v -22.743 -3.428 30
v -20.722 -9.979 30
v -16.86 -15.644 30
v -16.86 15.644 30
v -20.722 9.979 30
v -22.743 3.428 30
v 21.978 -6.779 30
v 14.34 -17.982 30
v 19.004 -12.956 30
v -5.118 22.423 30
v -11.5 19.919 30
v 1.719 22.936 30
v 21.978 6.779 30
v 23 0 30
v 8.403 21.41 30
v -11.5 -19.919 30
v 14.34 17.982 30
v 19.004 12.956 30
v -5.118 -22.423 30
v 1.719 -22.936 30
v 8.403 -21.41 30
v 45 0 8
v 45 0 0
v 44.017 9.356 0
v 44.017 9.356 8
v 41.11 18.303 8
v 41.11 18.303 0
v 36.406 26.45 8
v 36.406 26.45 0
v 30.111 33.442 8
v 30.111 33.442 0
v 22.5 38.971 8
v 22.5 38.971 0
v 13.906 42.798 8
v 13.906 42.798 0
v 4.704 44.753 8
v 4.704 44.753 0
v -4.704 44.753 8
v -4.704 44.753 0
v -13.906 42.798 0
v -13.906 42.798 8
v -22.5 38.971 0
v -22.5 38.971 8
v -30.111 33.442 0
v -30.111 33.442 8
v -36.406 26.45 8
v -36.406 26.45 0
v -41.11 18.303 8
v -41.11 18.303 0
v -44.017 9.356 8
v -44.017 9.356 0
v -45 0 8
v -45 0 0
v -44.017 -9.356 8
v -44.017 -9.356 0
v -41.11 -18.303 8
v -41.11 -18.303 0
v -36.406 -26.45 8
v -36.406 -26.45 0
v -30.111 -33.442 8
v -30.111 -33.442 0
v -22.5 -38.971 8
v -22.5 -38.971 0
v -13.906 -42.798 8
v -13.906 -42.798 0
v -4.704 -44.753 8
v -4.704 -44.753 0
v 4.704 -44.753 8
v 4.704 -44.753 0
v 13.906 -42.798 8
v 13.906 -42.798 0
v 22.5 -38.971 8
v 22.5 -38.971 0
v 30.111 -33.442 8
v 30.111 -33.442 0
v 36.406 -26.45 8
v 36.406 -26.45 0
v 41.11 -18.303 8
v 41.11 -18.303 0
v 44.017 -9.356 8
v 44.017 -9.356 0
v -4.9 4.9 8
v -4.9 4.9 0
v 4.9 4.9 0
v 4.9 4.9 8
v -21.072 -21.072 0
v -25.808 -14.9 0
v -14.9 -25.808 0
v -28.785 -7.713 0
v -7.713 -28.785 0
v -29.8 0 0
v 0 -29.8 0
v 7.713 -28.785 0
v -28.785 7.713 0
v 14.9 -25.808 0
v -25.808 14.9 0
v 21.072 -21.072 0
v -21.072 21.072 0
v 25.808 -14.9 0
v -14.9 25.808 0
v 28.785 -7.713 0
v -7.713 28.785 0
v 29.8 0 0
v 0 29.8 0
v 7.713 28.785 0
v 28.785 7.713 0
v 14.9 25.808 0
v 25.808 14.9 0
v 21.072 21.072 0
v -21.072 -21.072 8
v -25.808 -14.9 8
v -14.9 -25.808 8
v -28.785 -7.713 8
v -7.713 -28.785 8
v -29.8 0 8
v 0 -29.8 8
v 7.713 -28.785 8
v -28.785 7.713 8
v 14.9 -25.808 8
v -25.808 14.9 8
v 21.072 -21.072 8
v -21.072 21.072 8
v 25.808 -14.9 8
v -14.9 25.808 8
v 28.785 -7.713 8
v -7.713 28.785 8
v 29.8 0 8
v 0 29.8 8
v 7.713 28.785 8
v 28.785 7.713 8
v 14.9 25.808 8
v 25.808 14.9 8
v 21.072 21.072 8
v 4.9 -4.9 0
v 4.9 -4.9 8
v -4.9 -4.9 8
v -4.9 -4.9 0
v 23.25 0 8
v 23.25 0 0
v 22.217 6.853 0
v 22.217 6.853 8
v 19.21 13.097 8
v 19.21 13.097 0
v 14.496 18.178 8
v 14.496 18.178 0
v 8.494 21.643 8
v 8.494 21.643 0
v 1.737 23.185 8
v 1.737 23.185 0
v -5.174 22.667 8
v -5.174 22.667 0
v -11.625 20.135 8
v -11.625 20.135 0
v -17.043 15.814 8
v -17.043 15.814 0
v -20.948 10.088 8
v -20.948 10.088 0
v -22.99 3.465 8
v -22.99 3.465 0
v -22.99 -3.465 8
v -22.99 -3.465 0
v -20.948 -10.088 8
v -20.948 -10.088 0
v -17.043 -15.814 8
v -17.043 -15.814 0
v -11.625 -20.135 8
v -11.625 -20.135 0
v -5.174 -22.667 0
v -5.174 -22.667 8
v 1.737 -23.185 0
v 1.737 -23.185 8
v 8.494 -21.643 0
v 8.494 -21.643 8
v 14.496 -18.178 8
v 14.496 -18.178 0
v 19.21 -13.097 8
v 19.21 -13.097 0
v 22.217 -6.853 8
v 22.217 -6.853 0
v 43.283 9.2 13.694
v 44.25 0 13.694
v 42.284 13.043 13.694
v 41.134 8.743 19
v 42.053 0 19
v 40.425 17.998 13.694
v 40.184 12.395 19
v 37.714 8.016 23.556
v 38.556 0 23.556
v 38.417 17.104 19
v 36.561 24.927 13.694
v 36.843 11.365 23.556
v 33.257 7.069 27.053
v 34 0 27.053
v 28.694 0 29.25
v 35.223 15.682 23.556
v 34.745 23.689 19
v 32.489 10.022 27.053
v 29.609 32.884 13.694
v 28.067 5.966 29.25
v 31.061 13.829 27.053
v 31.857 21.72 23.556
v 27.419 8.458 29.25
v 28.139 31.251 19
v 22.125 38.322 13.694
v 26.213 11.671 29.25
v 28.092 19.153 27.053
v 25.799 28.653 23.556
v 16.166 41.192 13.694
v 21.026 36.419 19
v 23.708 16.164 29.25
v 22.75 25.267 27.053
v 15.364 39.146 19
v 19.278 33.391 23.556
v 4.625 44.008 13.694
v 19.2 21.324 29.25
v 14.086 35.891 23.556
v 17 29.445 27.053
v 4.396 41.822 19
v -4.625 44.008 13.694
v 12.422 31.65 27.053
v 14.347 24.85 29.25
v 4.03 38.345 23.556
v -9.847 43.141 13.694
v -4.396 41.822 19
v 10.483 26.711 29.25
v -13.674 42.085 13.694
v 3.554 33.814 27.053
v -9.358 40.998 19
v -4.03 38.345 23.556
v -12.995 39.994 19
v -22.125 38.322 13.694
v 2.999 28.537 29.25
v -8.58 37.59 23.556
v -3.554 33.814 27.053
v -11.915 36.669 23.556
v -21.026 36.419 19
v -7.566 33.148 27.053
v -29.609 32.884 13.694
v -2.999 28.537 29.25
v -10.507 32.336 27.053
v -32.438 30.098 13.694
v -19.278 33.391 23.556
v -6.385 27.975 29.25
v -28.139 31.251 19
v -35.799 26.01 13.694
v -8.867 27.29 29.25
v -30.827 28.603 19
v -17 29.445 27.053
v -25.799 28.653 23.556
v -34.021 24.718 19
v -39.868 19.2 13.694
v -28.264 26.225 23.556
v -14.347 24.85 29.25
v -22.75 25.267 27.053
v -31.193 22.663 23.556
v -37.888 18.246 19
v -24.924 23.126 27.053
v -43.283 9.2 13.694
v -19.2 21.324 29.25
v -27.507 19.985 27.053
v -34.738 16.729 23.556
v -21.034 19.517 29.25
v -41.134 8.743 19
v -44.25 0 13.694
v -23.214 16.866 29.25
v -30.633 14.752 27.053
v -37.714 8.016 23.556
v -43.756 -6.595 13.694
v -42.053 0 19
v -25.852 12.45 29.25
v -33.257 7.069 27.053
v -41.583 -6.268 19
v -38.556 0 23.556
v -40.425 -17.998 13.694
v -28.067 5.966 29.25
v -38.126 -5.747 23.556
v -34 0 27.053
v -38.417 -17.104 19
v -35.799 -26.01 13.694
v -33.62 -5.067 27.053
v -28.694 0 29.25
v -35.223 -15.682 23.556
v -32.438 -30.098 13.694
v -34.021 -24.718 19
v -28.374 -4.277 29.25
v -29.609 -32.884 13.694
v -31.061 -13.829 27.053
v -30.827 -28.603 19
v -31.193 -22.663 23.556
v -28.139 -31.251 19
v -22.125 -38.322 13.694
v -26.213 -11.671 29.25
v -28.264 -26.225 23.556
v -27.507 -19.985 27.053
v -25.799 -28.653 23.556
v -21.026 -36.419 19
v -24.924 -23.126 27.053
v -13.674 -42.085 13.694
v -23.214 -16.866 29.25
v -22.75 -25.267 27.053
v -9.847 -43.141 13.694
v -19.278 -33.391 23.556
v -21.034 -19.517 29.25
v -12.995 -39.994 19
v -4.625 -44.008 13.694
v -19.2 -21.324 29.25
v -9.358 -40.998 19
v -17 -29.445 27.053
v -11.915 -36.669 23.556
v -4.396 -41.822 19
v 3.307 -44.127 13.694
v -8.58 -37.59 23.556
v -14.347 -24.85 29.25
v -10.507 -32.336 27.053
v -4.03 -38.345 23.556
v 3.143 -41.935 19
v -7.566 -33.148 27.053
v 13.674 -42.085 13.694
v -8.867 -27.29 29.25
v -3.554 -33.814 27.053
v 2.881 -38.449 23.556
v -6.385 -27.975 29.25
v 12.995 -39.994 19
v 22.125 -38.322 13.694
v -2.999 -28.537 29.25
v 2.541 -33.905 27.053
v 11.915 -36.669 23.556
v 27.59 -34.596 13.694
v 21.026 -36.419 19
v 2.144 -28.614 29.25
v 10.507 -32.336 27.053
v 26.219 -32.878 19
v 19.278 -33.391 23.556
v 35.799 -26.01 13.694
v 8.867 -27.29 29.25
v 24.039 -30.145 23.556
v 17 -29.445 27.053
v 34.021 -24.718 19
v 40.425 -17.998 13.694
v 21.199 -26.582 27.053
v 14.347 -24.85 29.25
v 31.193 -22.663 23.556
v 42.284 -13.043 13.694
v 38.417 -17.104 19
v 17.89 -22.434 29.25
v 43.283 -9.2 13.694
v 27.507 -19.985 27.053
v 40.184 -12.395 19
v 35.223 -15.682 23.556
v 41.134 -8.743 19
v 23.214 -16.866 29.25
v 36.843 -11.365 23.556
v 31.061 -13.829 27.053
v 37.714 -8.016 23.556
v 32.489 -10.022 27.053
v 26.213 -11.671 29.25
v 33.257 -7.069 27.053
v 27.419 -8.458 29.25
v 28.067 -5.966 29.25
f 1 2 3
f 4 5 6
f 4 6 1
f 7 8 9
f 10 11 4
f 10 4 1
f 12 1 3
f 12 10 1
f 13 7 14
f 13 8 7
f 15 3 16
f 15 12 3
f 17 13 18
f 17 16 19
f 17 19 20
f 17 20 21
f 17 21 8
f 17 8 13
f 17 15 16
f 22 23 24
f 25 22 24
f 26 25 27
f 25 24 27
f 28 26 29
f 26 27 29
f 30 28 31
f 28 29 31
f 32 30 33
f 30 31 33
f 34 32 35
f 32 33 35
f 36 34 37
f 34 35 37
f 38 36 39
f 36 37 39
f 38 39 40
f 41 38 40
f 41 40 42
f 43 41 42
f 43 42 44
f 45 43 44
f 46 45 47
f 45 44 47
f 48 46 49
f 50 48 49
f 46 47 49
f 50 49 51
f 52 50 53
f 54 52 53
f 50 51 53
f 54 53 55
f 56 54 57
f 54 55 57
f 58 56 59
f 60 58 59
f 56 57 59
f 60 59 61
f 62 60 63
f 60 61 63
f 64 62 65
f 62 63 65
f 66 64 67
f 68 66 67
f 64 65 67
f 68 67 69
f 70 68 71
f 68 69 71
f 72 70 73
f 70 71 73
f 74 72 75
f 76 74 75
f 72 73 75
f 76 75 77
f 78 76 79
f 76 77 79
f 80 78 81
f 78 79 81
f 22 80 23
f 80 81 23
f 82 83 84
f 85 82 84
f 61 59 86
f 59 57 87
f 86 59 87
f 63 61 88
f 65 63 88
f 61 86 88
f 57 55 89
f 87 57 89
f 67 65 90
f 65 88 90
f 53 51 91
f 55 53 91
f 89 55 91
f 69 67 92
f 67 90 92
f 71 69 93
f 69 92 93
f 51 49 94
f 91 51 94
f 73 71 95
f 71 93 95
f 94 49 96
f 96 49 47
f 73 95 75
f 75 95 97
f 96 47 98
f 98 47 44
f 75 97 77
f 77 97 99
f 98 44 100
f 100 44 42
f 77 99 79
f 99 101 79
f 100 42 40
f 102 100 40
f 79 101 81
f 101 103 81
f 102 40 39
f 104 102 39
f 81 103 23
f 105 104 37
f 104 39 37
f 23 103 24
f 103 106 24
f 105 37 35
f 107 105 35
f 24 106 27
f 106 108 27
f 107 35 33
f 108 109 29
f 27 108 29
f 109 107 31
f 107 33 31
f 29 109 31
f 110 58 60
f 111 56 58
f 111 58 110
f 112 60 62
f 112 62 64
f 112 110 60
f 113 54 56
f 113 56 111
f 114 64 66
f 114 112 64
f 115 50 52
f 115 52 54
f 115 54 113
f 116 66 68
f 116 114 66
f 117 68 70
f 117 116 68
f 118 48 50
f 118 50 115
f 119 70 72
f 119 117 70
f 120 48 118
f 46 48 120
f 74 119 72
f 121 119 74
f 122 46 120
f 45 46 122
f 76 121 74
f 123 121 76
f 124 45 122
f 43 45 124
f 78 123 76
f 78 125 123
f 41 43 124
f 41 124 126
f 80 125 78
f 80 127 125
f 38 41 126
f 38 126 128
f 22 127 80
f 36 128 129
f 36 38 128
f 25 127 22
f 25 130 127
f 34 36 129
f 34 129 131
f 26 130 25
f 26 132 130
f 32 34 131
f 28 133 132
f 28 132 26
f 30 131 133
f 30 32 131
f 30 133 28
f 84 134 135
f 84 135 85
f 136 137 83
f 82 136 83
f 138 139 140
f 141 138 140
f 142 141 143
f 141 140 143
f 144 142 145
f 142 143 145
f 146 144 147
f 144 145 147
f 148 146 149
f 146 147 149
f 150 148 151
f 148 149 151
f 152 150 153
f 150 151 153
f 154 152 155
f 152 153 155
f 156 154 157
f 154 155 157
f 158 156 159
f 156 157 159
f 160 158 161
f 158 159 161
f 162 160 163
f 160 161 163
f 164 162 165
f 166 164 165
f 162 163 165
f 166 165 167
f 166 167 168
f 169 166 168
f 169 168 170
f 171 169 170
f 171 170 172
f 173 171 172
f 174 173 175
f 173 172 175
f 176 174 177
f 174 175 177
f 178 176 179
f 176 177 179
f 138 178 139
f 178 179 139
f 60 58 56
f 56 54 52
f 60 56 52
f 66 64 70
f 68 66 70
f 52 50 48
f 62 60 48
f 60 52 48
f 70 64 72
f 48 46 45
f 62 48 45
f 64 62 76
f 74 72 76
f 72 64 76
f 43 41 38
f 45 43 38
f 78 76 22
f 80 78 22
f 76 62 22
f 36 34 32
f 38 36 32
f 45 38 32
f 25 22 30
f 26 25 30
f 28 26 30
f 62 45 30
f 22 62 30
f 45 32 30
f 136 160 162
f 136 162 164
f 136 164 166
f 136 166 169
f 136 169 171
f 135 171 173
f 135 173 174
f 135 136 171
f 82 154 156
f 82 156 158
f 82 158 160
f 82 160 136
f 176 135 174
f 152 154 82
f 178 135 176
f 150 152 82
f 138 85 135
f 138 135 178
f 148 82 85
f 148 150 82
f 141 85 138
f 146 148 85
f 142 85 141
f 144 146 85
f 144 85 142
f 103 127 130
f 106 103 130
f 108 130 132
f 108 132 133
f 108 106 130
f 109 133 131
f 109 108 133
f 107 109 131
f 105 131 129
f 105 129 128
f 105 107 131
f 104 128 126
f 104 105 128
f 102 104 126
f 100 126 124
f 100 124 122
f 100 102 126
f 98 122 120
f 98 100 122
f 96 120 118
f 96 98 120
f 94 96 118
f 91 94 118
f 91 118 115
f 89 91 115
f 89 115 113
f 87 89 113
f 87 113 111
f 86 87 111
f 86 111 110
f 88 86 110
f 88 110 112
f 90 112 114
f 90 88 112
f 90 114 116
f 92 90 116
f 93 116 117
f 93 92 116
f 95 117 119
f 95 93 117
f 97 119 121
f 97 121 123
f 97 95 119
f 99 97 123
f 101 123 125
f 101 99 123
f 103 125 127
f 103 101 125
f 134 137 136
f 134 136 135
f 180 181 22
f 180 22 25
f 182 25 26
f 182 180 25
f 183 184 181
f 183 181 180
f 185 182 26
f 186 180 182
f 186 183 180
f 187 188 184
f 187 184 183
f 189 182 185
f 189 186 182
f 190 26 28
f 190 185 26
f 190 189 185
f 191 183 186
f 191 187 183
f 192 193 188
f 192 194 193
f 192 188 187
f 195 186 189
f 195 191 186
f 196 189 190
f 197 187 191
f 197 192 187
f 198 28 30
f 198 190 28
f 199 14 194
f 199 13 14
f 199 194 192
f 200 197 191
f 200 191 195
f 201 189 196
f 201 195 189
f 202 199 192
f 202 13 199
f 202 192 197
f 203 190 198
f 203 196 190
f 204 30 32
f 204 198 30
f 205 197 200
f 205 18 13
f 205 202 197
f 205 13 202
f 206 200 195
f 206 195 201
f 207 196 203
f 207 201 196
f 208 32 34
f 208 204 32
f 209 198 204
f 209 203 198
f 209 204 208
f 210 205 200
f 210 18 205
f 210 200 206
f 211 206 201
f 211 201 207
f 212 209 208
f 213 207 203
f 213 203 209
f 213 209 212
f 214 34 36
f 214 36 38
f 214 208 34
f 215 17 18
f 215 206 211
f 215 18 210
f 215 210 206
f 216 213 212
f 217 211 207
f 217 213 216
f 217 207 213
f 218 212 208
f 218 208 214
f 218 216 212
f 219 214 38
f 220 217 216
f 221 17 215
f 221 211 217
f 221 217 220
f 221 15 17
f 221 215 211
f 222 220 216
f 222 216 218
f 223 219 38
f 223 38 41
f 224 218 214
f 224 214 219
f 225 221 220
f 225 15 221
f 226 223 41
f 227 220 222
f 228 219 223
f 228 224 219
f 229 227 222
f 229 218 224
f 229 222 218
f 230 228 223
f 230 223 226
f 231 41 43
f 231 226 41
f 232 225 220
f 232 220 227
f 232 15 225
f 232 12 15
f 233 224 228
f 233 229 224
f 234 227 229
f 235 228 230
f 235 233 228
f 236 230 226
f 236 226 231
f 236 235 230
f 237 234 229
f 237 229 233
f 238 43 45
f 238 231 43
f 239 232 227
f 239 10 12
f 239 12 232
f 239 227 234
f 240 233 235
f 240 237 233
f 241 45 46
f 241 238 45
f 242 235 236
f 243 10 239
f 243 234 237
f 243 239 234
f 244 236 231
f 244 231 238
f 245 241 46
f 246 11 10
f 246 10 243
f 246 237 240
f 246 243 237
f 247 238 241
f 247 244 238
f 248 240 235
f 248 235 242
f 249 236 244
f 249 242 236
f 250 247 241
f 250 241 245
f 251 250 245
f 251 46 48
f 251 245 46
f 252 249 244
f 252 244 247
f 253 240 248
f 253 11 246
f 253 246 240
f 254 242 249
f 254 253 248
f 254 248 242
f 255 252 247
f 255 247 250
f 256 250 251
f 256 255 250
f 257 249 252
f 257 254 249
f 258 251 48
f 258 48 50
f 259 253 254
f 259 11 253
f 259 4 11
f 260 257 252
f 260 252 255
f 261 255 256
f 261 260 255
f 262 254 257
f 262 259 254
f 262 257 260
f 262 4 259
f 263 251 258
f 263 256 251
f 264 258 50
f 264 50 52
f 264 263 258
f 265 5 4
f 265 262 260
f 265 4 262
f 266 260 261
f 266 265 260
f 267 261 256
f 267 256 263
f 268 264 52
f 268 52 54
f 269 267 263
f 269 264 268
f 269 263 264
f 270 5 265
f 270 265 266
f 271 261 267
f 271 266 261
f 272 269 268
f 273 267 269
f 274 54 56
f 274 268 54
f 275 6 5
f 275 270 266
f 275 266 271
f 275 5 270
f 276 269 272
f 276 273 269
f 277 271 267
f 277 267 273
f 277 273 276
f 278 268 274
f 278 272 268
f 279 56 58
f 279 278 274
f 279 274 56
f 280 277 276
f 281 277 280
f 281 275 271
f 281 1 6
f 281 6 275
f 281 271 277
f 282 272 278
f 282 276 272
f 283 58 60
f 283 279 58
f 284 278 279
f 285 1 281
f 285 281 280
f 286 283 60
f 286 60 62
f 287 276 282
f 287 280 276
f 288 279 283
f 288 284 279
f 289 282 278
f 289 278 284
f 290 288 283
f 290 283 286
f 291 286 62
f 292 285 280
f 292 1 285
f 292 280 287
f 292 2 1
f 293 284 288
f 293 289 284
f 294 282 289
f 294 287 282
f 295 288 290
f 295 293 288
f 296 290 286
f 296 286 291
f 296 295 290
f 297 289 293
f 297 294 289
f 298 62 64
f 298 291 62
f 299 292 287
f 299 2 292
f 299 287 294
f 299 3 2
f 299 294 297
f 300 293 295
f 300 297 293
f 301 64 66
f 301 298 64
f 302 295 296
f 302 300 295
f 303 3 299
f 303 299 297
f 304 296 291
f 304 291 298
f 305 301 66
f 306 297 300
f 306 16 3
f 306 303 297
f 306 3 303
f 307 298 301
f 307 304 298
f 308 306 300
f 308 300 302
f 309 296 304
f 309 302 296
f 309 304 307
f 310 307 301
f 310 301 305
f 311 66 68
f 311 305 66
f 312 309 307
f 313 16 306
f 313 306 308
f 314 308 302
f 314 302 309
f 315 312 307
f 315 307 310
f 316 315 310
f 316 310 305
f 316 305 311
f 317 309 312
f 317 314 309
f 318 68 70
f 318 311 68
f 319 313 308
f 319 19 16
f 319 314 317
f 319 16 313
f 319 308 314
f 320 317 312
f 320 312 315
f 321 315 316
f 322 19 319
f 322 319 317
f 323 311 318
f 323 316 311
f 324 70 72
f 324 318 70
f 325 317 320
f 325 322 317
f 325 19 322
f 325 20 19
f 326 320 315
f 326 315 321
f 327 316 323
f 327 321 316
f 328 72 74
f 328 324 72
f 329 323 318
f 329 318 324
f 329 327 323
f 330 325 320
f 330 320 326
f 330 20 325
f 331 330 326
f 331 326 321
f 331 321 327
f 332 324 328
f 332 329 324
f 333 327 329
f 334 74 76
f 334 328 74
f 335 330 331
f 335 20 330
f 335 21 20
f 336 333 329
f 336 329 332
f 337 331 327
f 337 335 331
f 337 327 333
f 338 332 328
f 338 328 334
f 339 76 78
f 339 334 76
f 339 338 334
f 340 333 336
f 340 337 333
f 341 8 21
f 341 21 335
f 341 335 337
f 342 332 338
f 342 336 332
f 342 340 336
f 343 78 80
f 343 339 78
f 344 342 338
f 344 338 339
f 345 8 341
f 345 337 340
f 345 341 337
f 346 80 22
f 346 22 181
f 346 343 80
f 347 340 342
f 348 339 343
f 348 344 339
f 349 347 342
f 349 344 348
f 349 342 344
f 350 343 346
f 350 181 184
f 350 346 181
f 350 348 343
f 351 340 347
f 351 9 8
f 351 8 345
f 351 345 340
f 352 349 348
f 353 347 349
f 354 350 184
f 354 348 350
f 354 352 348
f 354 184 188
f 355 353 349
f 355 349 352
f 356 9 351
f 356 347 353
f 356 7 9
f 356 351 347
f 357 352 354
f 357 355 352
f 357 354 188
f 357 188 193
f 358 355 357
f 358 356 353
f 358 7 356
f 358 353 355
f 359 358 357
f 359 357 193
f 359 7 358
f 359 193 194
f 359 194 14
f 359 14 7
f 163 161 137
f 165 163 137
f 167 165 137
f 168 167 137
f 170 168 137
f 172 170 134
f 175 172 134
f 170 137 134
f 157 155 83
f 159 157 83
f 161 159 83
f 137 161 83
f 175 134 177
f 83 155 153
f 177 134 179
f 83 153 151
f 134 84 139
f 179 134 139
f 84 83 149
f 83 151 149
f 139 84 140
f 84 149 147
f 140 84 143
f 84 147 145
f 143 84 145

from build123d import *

# Parameters (mm, degrees)
F0_R     = 23.25
F0_W     = 9.8
F0_H     = 9.8
F1_DEPTH = 8
F0_R_2   = 45
F0_R_3   = 29.8
F2_R     = 45
F2_R_2   = 29.8
F3_DEPTH = 22
F4_R     = 21.99999


# Not quite as in the source:
# - a fillet or chamfer is up to 0.001 mm smaller than in the source, because OpenCascade refuses the exact size


with BuildPart() as f1:
    # F0 (on Top) → F1 (new body)
    with BuildSketch(Plane.XY):
        Circle(F0_R)
        Rectangle(F0_W, F0_H, mode=Mode.SUBTRACT)
    extrude(amount=F1_DEPTH)


with BuildPart() as f1b:
    # F0 (on Top) → F1, piece 2 (new body)
    with BuildSketch(Plane.XY):
        Circle(F0_R_2)
        Circle(F0_R_3, mode=Mode.SUBTRACT)
    extrude(amount=F1_DEPTH)


with BuildPart() as f3:
    # F2 (on face) → F3 (new body)
    with BuildSketch(Plane.XY.offset(8)):
        Circle(F2_R)
        Circle(F2_R_2, mode=Mode.SUBTRACT)
        Circle(F2_R_2)
    extrude(amount=F3_DEPTH)

    # F4 (radius 22 in the source; OpenCascade refuses exactly that, so slightly less here)
    f4_edges = [f3.edges().sort_by_distance(p)[0] for p in [
        (-45, 0, 30),
    ]]
    fillet(f4_edges, radius=F4_R)


solid = Compound([f1.part, f1b.part, f3.part])
